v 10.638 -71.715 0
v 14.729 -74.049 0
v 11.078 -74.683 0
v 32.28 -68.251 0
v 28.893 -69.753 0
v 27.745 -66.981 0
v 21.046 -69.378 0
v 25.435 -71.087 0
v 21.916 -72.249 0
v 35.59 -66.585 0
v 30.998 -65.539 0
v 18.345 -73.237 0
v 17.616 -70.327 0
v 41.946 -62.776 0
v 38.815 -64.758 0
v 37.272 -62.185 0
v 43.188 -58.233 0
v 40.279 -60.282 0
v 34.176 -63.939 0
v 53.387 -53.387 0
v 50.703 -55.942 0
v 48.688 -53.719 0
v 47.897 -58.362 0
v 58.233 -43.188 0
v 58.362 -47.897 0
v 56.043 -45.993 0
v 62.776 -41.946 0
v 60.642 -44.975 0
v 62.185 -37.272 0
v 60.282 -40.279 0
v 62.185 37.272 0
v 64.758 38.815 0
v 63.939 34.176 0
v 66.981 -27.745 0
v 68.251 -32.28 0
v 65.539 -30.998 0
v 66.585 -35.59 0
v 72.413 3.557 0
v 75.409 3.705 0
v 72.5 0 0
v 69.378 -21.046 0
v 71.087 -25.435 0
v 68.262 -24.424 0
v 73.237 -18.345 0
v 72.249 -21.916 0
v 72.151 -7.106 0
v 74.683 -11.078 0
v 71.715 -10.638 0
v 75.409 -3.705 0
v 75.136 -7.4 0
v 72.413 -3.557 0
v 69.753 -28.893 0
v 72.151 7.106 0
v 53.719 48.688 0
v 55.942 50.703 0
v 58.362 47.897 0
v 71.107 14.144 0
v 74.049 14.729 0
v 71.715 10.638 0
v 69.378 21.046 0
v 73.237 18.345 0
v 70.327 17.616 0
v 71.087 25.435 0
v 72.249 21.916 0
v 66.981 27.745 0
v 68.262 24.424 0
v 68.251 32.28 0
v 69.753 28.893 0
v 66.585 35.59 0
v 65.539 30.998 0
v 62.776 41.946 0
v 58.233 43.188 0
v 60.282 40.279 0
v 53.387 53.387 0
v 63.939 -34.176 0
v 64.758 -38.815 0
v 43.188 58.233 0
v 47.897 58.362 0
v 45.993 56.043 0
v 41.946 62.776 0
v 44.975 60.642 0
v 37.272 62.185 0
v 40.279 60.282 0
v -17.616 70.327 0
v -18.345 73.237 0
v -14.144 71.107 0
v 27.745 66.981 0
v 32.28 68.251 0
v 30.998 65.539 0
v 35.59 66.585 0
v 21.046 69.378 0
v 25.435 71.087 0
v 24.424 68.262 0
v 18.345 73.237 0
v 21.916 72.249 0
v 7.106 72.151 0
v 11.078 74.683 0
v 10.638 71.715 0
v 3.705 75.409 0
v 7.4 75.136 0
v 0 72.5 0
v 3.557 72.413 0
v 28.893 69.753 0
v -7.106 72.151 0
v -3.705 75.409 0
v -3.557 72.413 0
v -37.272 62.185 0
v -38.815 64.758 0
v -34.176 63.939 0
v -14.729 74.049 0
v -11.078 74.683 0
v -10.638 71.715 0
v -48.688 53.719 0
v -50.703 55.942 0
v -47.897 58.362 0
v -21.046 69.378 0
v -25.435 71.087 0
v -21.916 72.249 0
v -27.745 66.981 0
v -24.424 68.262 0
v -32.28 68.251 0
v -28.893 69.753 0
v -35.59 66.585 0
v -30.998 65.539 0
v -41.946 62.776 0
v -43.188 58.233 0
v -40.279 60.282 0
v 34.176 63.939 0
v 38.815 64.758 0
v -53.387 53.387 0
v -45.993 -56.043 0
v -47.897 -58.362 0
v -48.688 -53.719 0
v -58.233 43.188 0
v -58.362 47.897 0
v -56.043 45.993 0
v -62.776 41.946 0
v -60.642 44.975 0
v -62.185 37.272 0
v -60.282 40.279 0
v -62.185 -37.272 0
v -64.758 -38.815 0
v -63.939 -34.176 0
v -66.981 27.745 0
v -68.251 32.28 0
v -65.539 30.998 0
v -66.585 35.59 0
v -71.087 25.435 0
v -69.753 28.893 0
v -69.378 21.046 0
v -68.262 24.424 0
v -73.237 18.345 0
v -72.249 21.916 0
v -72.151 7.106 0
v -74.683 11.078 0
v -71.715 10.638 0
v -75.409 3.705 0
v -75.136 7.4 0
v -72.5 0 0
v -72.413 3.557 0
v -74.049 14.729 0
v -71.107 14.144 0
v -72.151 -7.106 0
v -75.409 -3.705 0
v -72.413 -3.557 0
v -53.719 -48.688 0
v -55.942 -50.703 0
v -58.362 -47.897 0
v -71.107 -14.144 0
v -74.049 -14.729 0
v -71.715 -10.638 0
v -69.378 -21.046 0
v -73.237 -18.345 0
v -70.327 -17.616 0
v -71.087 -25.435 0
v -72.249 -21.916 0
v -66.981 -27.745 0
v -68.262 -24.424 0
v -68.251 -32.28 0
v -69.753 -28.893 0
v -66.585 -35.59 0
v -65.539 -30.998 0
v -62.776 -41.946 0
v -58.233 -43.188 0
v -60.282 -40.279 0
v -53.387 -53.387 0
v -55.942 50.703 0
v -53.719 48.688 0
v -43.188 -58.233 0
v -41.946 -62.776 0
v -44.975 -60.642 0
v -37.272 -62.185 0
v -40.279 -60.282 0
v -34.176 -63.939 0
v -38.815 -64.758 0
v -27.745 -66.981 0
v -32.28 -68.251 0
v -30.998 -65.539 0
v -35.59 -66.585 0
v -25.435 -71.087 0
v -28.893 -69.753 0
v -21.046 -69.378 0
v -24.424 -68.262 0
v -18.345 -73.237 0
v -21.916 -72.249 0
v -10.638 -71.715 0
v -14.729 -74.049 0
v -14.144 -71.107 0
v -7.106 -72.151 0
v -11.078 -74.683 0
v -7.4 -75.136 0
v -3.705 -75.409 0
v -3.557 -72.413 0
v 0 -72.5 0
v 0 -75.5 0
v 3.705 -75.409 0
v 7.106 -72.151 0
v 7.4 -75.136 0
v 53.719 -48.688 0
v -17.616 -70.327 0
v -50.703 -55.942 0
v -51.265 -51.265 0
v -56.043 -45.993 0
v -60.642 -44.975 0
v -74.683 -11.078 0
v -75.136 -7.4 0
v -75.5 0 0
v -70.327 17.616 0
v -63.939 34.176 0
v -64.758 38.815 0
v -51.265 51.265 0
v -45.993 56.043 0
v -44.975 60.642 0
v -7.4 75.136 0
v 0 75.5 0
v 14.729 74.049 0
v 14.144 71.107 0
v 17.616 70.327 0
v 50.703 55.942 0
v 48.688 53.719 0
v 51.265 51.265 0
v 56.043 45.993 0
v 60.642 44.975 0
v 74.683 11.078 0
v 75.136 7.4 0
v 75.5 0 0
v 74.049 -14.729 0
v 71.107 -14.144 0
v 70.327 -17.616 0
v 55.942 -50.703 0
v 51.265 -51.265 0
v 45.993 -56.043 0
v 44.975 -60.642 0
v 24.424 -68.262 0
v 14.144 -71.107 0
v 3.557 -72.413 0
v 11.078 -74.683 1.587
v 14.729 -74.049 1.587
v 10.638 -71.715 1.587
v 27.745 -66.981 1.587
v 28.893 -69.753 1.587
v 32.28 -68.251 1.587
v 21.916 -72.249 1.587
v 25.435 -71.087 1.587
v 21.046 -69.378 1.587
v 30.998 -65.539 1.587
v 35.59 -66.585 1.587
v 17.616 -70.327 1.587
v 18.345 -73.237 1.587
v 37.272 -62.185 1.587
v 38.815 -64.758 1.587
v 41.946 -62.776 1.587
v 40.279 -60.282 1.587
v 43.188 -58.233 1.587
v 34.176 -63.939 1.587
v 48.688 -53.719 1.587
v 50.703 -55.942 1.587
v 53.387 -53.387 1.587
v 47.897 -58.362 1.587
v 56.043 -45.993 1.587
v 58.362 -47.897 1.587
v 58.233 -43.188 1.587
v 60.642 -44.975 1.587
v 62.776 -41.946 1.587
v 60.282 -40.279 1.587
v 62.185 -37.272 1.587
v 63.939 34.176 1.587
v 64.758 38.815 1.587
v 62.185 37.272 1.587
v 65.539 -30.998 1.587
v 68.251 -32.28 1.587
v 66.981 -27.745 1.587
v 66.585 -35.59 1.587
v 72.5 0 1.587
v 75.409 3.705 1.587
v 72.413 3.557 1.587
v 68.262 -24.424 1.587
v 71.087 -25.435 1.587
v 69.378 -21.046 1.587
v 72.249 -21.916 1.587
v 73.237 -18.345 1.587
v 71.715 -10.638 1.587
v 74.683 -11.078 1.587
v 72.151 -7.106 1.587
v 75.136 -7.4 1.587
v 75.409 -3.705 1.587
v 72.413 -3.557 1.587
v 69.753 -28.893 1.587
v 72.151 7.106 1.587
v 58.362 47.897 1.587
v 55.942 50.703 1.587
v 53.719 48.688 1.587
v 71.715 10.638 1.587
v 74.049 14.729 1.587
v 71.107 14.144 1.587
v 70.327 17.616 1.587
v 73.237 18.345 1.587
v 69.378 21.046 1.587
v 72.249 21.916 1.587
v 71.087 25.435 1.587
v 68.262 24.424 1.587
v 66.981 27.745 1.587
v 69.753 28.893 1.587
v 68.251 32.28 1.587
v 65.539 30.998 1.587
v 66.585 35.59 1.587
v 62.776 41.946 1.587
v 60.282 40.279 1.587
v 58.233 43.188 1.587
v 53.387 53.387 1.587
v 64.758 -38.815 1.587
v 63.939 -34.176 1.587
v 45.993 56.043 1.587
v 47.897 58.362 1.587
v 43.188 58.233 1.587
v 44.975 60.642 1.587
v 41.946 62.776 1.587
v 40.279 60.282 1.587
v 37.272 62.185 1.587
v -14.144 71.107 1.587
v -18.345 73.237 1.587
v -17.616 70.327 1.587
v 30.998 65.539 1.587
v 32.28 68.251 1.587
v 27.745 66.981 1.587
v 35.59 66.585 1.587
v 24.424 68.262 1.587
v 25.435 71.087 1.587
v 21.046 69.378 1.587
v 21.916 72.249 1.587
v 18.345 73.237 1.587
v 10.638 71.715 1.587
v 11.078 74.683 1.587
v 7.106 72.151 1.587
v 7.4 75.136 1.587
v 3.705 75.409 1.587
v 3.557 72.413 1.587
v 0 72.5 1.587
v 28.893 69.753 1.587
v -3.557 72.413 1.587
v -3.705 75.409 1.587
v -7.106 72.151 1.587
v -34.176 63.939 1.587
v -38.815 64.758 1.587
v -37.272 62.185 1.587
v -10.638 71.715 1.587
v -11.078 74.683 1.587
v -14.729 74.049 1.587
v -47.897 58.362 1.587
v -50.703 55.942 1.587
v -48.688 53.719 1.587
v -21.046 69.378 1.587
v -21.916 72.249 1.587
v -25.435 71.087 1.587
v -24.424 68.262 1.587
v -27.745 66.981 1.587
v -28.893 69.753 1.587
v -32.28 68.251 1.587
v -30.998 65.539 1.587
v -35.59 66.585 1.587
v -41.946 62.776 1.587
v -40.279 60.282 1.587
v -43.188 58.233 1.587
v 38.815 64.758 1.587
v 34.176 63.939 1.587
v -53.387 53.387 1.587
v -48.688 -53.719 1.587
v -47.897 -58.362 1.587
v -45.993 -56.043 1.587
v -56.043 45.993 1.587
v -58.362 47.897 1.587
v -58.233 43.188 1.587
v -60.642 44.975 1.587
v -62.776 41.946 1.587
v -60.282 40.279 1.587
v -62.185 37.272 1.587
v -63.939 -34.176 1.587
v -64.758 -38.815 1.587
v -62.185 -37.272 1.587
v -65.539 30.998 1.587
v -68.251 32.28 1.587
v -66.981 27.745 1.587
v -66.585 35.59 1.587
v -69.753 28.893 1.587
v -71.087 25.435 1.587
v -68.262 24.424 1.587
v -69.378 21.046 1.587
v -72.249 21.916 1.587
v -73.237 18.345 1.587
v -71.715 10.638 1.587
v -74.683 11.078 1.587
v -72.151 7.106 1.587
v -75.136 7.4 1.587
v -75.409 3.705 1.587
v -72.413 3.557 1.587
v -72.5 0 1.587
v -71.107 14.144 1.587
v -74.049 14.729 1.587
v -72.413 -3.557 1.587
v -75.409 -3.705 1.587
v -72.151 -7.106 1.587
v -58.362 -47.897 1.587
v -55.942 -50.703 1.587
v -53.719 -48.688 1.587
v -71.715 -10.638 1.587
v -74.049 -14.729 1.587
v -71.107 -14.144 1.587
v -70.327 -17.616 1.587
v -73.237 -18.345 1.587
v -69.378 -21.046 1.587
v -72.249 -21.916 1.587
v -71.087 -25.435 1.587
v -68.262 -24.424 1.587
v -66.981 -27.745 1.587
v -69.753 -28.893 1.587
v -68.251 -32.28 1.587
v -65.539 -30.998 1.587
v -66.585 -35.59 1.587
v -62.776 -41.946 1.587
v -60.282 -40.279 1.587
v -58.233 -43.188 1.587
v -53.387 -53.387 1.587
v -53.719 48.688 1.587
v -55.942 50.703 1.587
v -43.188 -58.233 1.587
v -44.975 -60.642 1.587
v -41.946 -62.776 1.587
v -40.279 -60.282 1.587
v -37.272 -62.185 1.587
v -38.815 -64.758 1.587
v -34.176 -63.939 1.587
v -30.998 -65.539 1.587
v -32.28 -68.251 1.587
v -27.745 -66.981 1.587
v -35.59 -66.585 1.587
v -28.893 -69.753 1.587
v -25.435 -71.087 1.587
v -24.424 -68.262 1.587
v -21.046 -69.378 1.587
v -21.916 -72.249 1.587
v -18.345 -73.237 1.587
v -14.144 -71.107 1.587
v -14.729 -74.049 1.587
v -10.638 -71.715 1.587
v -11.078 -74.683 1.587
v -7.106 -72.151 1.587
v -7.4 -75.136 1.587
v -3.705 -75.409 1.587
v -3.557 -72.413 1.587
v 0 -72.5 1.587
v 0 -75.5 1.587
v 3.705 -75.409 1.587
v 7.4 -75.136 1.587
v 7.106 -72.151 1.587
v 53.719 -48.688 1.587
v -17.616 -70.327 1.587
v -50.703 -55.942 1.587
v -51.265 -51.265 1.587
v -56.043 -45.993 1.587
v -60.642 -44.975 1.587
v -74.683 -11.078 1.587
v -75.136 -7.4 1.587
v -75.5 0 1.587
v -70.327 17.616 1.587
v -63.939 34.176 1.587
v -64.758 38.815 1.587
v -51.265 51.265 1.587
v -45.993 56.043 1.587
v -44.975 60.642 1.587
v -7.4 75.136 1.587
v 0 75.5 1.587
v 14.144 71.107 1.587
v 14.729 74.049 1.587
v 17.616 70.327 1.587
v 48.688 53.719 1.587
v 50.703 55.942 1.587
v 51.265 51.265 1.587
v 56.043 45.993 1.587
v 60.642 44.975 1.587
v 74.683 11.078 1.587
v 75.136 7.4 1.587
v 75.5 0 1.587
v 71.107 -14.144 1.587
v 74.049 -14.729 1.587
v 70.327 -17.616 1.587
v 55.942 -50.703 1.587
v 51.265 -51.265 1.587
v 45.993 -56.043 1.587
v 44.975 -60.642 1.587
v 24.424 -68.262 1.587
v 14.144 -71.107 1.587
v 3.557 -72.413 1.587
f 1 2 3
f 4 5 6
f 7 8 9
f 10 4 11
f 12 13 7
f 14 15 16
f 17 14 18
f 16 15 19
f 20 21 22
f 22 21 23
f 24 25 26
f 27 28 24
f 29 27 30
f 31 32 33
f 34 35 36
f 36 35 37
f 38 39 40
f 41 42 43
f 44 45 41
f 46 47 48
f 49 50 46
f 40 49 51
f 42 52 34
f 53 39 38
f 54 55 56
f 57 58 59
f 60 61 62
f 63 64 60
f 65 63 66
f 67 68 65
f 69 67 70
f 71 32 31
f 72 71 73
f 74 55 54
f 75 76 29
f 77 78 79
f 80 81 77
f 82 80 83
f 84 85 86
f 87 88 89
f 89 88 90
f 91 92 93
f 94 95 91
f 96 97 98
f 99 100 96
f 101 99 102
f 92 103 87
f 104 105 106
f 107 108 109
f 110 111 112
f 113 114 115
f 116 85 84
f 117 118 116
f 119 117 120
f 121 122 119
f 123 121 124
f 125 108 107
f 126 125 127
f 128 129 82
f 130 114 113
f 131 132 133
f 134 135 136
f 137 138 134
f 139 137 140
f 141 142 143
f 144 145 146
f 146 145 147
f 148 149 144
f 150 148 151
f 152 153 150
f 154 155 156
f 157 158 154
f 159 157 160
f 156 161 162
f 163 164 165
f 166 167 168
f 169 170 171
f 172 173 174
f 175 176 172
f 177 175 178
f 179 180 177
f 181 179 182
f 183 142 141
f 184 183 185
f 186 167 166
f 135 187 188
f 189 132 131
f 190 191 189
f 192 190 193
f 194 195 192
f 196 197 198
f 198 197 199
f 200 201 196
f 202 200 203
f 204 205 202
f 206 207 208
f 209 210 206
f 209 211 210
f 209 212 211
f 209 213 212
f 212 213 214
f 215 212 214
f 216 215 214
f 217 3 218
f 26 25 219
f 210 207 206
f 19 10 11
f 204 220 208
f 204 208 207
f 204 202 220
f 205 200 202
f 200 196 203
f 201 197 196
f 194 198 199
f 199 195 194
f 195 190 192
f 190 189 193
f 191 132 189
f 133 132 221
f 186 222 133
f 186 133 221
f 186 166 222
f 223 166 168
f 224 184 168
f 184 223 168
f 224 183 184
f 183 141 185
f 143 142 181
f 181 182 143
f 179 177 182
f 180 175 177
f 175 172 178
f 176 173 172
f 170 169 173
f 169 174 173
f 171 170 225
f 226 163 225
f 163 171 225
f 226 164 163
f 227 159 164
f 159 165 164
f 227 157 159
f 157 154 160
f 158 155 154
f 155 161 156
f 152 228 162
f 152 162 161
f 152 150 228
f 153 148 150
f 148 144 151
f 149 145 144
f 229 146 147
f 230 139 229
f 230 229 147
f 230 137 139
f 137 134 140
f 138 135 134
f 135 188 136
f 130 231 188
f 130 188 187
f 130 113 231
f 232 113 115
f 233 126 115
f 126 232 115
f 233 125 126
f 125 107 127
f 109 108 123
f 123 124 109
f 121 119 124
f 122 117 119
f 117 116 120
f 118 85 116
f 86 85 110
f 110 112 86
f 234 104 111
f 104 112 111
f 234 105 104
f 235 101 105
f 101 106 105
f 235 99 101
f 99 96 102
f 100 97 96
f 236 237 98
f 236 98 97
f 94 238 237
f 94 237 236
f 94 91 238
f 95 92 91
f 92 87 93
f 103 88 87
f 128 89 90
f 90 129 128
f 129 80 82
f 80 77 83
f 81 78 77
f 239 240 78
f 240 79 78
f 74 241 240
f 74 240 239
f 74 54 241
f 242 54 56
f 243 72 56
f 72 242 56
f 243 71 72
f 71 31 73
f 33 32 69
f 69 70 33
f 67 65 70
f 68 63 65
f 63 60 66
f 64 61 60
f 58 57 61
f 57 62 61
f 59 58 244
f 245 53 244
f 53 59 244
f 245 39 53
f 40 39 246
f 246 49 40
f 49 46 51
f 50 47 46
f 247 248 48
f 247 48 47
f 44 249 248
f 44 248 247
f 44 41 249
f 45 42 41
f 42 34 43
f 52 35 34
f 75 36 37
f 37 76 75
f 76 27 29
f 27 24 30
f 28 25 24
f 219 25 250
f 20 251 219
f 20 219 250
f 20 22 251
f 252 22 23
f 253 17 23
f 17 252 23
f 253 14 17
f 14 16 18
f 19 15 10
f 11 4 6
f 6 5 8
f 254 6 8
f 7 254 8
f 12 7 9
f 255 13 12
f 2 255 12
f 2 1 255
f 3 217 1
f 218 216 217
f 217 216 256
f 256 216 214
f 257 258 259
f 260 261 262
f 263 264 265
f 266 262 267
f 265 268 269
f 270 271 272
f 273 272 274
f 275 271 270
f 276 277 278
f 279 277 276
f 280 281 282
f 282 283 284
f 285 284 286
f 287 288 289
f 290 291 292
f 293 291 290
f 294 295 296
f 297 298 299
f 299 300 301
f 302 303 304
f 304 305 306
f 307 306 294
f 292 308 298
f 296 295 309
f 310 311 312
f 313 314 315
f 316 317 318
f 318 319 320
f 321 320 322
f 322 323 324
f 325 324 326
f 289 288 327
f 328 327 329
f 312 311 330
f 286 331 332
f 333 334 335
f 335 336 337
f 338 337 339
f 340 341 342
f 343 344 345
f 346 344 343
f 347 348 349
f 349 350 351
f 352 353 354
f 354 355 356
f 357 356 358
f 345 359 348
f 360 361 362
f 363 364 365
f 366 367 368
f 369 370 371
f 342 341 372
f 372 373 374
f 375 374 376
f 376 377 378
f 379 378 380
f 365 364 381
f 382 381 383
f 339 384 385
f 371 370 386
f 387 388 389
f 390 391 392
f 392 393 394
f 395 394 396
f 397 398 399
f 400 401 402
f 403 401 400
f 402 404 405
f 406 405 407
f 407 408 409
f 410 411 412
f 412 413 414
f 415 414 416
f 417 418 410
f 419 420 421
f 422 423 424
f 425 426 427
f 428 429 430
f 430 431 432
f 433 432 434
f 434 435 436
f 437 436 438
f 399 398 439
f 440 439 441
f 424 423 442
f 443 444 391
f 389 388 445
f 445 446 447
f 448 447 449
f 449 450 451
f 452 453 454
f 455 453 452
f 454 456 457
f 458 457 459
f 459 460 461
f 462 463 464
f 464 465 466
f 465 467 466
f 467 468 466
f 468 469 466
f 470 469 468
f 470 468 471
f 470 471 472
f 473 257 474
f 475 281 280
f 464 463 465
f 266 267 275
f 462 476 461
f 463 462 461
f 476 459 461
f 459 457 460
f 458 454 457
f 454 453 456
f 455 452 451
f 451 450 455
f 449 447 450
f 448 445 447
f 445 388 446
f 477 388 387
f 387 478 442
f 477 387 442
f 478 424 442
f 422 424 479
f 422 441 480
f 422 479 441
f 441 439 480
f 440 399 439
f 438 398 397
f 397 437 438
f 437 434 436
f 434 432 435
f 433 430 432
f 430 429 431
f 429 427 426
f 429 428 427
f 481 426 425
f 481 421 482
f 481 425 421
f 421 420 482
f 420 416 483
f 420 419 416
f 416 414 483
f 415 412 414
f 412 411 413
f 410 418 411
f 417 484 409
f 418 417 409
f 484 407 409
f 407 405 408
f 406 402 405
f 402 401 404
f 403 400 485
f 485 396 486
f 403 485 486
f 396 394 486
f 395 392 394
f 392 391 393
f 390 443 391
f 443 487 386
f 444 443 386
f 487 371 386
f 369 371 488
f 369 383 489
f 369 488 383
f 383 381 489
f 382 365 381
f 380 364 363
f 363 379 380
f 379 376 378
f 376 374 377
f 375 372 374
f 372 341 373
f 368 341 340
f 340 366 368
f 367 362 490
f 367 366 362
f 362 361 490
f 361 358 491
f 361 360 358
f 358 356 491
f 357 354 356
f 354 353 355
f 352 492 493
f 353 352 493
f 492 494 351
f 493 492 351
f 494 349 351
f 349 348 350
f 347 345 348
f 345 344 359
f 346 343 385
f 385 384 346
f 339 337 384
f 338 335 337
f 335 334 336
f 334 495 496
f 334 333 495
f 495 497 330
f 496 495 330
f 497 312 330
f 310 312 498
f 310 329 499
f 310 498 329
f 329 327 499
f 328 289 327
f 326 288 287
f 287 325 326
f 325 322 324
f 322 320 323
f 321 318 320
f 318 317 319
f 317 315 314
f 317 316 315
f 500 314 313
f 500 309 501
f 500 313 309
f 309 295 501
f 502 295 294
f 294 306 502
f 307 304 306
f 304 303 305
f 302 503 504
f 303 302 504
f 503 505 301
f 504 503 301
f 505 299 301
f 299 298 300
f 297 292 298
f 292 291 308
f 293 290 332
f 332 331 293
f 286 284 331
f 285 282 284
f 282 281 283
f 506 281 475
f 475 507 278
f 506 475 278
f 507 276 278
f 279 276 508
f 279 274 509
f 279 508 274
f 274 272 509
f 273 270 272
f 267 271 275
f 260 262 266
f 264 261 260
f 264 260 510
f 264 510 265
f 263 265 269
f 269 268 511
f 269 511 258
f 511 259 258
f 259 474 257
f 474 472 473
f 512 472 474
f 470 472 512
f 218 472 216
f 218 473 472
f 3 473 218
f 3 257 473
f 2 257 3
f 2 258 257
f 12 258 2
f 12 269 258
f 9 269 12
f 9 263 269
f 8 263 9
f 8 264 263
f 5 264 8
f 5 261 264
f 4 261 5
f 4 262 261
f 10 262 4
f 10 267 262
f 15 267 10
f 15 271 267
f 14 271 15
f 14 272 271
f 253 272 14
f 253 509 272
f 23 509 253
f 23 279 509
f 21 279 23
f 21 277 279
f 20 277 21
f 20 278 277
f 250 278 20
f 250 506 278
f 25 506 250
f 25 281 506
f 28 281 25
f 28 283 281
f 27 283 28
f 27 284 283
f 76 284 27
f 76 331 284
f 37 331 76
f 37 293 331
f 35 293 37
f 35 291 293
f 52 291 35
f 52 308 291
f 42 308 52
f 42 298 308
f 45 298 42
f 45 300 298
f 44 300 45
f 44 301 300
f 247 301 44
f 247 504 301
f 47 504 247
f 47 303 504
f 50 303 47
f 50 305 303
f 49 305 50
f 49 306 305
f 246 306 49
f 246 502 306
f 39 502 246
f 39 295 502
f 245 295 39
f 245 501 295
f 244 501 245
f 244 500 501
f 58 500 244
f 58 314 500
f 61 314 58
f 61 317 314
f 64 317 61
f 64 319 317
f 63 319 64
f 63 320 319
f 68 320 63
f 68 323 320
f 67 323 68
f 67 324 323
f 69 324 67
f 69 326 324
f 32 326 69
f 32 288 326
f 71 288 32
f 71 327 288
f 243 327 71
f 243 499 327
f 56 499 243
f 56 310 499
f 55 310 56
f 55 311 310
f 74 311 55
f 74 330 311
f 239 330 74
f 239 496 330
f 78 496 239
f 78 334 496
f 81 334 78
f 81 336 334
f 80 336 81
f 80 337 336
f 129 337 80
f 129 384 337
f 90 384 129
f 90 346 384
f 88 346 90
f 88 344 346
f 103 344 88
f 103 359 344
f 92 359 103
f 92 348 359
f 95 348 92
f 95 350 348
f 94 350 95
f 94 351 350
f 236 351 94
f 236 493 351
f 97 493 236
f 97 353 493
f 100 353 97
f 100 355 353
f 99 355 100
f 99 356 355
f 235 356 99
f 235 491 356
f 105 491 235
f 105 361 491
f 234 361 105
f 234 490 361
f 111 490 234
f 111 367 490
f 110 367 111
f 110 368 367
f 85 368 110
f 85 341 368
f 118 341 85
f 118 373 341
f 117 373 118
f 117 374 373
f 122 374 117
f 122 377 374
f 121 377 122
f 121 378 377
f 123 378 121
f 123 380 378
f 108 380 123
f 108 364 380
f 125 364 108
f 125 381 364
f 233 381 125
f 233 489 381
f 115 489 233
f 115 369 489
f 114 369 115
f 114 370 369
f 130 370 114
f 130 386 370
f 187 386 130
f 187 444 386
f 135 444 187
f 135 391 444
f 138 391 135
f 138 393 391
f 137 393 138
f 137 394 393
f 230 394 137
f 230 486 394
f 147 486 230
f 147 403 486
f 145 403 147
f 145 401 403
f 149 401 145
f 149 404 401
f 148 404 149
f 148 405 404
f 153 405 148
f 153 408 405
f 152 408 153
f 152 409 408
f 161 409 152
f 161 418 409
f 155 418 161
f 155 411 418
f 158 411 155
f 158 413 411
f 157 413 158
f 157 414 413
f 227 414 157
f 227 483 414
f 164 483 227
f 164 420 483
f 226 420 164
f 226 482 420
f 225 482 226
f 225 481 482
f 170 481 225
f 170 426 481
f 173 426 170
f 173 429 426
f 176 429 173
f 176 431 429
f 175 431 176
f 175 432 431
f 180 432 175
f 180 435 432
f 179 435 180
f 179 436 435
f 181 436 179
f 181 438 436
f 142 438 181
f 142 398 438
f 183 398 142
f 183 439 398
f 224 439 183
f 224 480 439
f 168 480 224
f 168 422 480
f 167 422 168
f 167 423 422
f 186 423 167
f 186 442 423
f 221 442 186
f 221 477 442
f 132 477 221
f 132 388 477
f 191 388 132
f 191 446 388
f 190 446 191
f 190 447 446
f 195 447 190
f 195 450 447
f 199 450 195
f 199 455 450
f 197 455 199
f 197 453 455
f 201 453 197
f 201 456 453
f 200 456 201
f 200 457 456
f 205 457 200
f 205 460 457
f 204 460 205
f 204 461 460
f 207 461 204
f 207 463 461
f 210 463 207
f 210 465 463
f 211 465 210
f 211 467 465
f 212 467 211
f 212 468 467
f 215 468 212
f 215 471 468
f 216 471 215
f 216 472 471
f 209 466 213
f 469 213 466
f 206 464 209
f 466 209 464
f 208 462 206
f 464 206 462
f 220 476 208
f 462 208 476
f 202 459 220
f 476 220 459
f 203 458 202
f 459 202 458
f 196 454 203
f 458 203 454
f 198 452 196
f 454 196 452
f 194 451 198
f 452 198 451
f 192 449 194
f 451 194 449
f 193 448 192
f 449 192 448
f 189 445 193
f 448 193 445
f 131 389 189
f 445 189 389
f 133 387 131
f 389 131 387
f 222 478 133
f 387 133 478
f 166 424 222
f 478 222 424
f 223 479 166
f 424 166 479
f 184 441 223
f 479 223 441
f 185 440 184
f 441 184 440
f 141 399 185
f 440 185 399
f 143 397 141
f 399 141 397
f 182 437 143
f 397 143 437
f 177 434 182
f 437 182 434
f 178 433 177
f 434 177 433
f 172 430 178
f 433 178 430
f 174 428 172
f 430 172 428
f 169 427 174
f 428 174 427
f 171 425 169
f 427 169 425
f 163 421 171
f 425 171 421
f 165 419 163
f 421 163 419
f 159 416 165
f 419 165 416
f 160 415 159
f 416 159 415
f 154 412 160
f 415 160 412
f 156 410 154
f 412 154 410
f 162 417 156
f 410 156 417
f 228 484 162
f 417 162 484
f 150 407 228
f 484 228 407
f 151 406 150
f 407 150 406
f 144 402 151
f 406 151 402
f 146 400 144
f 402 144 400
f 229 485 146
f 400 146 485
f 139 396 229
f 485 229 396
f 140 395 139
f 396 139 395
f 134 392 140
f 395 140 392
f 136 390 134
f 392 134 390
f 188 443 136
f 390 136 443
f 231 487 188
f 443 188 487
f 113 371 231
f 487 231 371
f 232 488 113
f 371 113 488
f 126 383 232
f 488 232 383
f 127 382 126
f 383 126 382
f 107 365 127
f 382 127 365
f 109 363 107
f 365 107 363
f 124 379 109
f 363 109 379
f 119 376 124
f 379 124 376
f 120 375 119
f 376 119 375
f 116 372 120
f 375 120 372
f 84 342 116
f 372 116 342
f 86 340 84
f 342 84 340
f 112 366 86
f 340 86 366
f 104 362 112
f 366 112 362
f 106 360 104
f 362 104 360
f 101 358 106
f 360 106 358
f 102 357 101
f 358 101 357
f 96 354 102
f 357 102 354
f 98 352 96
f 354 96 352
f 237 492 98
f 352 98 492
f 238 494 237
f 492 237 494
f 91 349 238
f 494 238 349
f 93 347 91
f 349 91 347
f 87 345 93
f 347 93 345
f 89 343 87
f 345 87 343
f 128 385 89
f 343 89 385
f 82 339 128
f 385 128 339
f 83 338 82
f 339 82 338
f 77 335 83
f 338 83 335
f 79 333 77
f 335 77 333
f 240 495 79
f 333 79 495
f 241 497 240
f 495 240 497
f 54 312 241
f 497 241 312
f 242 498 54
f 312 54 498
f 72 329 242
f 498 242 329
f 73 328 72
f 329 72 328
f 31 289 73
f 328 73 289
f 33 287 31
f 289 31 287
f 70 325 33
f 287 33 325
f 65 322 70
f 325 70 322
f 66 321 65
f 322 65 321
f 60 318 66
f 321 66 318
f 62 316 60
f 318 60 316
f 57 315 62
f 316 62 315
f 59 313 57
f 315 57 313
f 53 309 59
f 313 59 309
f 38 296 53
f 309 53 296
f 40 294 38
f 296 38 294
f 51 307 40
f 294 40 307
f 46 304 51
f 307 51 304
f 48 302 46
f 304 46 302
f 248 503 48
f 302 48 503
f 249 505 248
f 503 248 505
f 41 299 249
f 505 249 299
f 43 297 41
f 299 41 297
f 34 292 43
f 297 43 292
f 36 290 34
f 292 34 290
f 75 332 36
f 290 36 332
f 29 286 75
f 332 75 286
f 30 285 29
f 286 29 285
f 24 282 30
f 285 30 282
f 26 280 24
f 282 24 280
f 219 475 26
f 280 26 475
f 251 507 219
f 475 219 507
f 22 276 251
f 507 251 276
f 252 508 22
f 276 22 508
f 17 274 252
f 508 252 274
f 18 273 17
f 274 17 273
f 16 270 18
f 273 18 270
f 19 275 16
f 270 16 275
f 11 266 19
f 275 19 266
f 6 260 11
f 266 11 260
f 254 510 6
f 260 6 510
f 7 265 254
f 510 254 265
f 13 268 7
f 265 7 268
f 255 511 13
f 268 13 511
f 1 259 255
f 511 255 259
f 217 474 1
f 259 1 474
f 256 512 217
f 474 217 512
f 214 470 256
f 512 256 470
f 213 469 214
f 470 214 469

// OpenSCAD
// file: ../utils/registries.scad
/**
 * @brief Look up a registered row by name.
 *
 * Build designations are passed as names, so every registry a build can designate wraps this
 * function below its list, where the list is in scope (a function resolves globals from its own
 * file):
 *
 *     use <../utils/registries.scad>;
 *     function shaft_by_name(name) = registry_by_name(shafts, name, "ssllsn");
 *
 * Rows are read by position, so `fields` describes the row layout. It is a signature with one
 * letter per field (s string, n number, l list, b bool; upper case if the field may also be
 * undef), or a list of signatures when a trailing field is optional. A plain number is also
 * accepted and checks only the length. Every row is checked on every lookup, not only the
 * requested one. A row with a missing or extra field, or a list where a number belongs, fails here
 * instead of returning the wrong value. Two swapped fields of the same type still pass; only named
 * fields would catch that.
 *
 * A missing name returns undef, and so does a duplicate name: two rows with the same name is a
 * defect, not a choice by list order. The caller must assert on the result, because only it can
 * name the registry searched. A failing assert exits 0, so the checks detect its ERROR line.
 */
function registry_by_name(rows, name, fields) =
  let (_checked = registry_checked(rows, fields))
  let (_m = [for (r = _checked) if (r[0] == name) r]) len(_m) == 1 ? _m[0] : undef;

// Returns the rows after checking that each fits one of the signatures. Also used directly for a
// registry whose rows have no name.
function registry_checked(rows, fields) =
  let (
    _n = is_list(fields) ? fields : [fields],
    _bad = [for (r = rows) if (len([for (f = _n) if (registry_row_fits(r, f)) f]) == 0) r[0]]
  )
  assert(len(_bad) == 0, str("registry rows ", _bad, " do not fit ", fields))
  rows;

function registry_row_fits(row, fields) =
  is_num(fields) ? len(row) == fields
  : len(row) == len(fields) && len([for (i = [0:len(fields) - 1]) if (!registry_field_fits(row[i], fields[i])) i]) == 0;

function registry_field_fits(v, t) =
  t == "s" ? is_string(v)
  : t == "n" ? is_num(v)
  : t == "l" ? is_list(v)
  : t == "b" ? is_bool(v)
  : t == "S" ? is_undef(v) || is_string(v)
  : t == "N" ? is_undef(v) || is_num(v)
  : t == "L" ? is_undef(v) || is_list(v)
  : t == "B" ? is_undef(v) || is_bool(v)
  : assert(false, str("registry signature letter \"", t, "\" is not one of s n l b S N L B"));
// file: ../purchased/gasket_sheets.scad
// parameters for physical realization of sheet gasket stock
// DO NOT FORMAT THIS FILE, as it is manually spaced out for readability

//                       ["name"           material  thickness  shore_a  [sheet_w, sheet_l]  part_no]

// Water- and steam-resistant EPDM, plain backing, ASTM D2000, black, -20 to 220 F, 800 psi.
sheet_epdm_1p6_60a   = ["EPDM 1/16 60A", "EPDM",   1.5875,    60,      [304.8,   304.8], "8525T65"];

gasket_sheets = [sheet_epdm_1p6_60a];

use <../utils/registries.scad>;
function gasket_sheet_by_name(name) = registry_by_name(gasket_sheets, name, "ssnnls");

function gasket_sheet_name(type) = type[0];
function gasket_sheet_material(type) = type[1];
function gasket_sheet_thickness(type) = type[2];
function gasket_sheet_shore_a(type) = type[3];
function gasket_sheet_size(type) = type[4];
function gasket_sheet_part_number(type) = type[5];

// Blanks of a given cut diameter off one sheet, in a plain grid; nesting would do better.
function gasket_sheet_yield(type, cut_diameter) =
  floor(gasket_sheet_size(type)[0] / cut_diameter)
  * floor(gasket_sheet_size(type)[1] / cut_diameter);
// main file
/**
 * @file sheet_gasket.scad
 * @brief Flat ring gasket, cut from sheet stock
 * @author Cameron K. Brooks
 * @copyright 2026
 *
 * Only the sheet is purchased. The ring diameters depend on the joint it seals, so the caller
 * passes them. The gasket is drawn at its uncompressed thickness, so the amount it stands proud of
 * the recess is the compression.
 */

use <../purchased/gasket_sheets.scad>;

$fn = $preview ? 64 : 128;

// example usage
sheet_gasket(inner_diameter=145, outer_diameter=151,
             thickness=gasket_sheet_thickness(gasket_sheet_by_name("EPDM 1/16 60A")));

module sheet_gasket(inner_diameter, outer_diameter, thickness, colour = "Black") {
  assert(
    outer_diameter > inner_diameter,
    str("sheet_gasket: outer_diameter (", outer_diameter, ") must exceed inner_diameter (", inner_diameter, ")")
  );

  color(colour)
    linear_extrude(thickness)
      difference() {
        circle(d=outer_diameter);
        circle(d=inner_diameter);
      }
}
